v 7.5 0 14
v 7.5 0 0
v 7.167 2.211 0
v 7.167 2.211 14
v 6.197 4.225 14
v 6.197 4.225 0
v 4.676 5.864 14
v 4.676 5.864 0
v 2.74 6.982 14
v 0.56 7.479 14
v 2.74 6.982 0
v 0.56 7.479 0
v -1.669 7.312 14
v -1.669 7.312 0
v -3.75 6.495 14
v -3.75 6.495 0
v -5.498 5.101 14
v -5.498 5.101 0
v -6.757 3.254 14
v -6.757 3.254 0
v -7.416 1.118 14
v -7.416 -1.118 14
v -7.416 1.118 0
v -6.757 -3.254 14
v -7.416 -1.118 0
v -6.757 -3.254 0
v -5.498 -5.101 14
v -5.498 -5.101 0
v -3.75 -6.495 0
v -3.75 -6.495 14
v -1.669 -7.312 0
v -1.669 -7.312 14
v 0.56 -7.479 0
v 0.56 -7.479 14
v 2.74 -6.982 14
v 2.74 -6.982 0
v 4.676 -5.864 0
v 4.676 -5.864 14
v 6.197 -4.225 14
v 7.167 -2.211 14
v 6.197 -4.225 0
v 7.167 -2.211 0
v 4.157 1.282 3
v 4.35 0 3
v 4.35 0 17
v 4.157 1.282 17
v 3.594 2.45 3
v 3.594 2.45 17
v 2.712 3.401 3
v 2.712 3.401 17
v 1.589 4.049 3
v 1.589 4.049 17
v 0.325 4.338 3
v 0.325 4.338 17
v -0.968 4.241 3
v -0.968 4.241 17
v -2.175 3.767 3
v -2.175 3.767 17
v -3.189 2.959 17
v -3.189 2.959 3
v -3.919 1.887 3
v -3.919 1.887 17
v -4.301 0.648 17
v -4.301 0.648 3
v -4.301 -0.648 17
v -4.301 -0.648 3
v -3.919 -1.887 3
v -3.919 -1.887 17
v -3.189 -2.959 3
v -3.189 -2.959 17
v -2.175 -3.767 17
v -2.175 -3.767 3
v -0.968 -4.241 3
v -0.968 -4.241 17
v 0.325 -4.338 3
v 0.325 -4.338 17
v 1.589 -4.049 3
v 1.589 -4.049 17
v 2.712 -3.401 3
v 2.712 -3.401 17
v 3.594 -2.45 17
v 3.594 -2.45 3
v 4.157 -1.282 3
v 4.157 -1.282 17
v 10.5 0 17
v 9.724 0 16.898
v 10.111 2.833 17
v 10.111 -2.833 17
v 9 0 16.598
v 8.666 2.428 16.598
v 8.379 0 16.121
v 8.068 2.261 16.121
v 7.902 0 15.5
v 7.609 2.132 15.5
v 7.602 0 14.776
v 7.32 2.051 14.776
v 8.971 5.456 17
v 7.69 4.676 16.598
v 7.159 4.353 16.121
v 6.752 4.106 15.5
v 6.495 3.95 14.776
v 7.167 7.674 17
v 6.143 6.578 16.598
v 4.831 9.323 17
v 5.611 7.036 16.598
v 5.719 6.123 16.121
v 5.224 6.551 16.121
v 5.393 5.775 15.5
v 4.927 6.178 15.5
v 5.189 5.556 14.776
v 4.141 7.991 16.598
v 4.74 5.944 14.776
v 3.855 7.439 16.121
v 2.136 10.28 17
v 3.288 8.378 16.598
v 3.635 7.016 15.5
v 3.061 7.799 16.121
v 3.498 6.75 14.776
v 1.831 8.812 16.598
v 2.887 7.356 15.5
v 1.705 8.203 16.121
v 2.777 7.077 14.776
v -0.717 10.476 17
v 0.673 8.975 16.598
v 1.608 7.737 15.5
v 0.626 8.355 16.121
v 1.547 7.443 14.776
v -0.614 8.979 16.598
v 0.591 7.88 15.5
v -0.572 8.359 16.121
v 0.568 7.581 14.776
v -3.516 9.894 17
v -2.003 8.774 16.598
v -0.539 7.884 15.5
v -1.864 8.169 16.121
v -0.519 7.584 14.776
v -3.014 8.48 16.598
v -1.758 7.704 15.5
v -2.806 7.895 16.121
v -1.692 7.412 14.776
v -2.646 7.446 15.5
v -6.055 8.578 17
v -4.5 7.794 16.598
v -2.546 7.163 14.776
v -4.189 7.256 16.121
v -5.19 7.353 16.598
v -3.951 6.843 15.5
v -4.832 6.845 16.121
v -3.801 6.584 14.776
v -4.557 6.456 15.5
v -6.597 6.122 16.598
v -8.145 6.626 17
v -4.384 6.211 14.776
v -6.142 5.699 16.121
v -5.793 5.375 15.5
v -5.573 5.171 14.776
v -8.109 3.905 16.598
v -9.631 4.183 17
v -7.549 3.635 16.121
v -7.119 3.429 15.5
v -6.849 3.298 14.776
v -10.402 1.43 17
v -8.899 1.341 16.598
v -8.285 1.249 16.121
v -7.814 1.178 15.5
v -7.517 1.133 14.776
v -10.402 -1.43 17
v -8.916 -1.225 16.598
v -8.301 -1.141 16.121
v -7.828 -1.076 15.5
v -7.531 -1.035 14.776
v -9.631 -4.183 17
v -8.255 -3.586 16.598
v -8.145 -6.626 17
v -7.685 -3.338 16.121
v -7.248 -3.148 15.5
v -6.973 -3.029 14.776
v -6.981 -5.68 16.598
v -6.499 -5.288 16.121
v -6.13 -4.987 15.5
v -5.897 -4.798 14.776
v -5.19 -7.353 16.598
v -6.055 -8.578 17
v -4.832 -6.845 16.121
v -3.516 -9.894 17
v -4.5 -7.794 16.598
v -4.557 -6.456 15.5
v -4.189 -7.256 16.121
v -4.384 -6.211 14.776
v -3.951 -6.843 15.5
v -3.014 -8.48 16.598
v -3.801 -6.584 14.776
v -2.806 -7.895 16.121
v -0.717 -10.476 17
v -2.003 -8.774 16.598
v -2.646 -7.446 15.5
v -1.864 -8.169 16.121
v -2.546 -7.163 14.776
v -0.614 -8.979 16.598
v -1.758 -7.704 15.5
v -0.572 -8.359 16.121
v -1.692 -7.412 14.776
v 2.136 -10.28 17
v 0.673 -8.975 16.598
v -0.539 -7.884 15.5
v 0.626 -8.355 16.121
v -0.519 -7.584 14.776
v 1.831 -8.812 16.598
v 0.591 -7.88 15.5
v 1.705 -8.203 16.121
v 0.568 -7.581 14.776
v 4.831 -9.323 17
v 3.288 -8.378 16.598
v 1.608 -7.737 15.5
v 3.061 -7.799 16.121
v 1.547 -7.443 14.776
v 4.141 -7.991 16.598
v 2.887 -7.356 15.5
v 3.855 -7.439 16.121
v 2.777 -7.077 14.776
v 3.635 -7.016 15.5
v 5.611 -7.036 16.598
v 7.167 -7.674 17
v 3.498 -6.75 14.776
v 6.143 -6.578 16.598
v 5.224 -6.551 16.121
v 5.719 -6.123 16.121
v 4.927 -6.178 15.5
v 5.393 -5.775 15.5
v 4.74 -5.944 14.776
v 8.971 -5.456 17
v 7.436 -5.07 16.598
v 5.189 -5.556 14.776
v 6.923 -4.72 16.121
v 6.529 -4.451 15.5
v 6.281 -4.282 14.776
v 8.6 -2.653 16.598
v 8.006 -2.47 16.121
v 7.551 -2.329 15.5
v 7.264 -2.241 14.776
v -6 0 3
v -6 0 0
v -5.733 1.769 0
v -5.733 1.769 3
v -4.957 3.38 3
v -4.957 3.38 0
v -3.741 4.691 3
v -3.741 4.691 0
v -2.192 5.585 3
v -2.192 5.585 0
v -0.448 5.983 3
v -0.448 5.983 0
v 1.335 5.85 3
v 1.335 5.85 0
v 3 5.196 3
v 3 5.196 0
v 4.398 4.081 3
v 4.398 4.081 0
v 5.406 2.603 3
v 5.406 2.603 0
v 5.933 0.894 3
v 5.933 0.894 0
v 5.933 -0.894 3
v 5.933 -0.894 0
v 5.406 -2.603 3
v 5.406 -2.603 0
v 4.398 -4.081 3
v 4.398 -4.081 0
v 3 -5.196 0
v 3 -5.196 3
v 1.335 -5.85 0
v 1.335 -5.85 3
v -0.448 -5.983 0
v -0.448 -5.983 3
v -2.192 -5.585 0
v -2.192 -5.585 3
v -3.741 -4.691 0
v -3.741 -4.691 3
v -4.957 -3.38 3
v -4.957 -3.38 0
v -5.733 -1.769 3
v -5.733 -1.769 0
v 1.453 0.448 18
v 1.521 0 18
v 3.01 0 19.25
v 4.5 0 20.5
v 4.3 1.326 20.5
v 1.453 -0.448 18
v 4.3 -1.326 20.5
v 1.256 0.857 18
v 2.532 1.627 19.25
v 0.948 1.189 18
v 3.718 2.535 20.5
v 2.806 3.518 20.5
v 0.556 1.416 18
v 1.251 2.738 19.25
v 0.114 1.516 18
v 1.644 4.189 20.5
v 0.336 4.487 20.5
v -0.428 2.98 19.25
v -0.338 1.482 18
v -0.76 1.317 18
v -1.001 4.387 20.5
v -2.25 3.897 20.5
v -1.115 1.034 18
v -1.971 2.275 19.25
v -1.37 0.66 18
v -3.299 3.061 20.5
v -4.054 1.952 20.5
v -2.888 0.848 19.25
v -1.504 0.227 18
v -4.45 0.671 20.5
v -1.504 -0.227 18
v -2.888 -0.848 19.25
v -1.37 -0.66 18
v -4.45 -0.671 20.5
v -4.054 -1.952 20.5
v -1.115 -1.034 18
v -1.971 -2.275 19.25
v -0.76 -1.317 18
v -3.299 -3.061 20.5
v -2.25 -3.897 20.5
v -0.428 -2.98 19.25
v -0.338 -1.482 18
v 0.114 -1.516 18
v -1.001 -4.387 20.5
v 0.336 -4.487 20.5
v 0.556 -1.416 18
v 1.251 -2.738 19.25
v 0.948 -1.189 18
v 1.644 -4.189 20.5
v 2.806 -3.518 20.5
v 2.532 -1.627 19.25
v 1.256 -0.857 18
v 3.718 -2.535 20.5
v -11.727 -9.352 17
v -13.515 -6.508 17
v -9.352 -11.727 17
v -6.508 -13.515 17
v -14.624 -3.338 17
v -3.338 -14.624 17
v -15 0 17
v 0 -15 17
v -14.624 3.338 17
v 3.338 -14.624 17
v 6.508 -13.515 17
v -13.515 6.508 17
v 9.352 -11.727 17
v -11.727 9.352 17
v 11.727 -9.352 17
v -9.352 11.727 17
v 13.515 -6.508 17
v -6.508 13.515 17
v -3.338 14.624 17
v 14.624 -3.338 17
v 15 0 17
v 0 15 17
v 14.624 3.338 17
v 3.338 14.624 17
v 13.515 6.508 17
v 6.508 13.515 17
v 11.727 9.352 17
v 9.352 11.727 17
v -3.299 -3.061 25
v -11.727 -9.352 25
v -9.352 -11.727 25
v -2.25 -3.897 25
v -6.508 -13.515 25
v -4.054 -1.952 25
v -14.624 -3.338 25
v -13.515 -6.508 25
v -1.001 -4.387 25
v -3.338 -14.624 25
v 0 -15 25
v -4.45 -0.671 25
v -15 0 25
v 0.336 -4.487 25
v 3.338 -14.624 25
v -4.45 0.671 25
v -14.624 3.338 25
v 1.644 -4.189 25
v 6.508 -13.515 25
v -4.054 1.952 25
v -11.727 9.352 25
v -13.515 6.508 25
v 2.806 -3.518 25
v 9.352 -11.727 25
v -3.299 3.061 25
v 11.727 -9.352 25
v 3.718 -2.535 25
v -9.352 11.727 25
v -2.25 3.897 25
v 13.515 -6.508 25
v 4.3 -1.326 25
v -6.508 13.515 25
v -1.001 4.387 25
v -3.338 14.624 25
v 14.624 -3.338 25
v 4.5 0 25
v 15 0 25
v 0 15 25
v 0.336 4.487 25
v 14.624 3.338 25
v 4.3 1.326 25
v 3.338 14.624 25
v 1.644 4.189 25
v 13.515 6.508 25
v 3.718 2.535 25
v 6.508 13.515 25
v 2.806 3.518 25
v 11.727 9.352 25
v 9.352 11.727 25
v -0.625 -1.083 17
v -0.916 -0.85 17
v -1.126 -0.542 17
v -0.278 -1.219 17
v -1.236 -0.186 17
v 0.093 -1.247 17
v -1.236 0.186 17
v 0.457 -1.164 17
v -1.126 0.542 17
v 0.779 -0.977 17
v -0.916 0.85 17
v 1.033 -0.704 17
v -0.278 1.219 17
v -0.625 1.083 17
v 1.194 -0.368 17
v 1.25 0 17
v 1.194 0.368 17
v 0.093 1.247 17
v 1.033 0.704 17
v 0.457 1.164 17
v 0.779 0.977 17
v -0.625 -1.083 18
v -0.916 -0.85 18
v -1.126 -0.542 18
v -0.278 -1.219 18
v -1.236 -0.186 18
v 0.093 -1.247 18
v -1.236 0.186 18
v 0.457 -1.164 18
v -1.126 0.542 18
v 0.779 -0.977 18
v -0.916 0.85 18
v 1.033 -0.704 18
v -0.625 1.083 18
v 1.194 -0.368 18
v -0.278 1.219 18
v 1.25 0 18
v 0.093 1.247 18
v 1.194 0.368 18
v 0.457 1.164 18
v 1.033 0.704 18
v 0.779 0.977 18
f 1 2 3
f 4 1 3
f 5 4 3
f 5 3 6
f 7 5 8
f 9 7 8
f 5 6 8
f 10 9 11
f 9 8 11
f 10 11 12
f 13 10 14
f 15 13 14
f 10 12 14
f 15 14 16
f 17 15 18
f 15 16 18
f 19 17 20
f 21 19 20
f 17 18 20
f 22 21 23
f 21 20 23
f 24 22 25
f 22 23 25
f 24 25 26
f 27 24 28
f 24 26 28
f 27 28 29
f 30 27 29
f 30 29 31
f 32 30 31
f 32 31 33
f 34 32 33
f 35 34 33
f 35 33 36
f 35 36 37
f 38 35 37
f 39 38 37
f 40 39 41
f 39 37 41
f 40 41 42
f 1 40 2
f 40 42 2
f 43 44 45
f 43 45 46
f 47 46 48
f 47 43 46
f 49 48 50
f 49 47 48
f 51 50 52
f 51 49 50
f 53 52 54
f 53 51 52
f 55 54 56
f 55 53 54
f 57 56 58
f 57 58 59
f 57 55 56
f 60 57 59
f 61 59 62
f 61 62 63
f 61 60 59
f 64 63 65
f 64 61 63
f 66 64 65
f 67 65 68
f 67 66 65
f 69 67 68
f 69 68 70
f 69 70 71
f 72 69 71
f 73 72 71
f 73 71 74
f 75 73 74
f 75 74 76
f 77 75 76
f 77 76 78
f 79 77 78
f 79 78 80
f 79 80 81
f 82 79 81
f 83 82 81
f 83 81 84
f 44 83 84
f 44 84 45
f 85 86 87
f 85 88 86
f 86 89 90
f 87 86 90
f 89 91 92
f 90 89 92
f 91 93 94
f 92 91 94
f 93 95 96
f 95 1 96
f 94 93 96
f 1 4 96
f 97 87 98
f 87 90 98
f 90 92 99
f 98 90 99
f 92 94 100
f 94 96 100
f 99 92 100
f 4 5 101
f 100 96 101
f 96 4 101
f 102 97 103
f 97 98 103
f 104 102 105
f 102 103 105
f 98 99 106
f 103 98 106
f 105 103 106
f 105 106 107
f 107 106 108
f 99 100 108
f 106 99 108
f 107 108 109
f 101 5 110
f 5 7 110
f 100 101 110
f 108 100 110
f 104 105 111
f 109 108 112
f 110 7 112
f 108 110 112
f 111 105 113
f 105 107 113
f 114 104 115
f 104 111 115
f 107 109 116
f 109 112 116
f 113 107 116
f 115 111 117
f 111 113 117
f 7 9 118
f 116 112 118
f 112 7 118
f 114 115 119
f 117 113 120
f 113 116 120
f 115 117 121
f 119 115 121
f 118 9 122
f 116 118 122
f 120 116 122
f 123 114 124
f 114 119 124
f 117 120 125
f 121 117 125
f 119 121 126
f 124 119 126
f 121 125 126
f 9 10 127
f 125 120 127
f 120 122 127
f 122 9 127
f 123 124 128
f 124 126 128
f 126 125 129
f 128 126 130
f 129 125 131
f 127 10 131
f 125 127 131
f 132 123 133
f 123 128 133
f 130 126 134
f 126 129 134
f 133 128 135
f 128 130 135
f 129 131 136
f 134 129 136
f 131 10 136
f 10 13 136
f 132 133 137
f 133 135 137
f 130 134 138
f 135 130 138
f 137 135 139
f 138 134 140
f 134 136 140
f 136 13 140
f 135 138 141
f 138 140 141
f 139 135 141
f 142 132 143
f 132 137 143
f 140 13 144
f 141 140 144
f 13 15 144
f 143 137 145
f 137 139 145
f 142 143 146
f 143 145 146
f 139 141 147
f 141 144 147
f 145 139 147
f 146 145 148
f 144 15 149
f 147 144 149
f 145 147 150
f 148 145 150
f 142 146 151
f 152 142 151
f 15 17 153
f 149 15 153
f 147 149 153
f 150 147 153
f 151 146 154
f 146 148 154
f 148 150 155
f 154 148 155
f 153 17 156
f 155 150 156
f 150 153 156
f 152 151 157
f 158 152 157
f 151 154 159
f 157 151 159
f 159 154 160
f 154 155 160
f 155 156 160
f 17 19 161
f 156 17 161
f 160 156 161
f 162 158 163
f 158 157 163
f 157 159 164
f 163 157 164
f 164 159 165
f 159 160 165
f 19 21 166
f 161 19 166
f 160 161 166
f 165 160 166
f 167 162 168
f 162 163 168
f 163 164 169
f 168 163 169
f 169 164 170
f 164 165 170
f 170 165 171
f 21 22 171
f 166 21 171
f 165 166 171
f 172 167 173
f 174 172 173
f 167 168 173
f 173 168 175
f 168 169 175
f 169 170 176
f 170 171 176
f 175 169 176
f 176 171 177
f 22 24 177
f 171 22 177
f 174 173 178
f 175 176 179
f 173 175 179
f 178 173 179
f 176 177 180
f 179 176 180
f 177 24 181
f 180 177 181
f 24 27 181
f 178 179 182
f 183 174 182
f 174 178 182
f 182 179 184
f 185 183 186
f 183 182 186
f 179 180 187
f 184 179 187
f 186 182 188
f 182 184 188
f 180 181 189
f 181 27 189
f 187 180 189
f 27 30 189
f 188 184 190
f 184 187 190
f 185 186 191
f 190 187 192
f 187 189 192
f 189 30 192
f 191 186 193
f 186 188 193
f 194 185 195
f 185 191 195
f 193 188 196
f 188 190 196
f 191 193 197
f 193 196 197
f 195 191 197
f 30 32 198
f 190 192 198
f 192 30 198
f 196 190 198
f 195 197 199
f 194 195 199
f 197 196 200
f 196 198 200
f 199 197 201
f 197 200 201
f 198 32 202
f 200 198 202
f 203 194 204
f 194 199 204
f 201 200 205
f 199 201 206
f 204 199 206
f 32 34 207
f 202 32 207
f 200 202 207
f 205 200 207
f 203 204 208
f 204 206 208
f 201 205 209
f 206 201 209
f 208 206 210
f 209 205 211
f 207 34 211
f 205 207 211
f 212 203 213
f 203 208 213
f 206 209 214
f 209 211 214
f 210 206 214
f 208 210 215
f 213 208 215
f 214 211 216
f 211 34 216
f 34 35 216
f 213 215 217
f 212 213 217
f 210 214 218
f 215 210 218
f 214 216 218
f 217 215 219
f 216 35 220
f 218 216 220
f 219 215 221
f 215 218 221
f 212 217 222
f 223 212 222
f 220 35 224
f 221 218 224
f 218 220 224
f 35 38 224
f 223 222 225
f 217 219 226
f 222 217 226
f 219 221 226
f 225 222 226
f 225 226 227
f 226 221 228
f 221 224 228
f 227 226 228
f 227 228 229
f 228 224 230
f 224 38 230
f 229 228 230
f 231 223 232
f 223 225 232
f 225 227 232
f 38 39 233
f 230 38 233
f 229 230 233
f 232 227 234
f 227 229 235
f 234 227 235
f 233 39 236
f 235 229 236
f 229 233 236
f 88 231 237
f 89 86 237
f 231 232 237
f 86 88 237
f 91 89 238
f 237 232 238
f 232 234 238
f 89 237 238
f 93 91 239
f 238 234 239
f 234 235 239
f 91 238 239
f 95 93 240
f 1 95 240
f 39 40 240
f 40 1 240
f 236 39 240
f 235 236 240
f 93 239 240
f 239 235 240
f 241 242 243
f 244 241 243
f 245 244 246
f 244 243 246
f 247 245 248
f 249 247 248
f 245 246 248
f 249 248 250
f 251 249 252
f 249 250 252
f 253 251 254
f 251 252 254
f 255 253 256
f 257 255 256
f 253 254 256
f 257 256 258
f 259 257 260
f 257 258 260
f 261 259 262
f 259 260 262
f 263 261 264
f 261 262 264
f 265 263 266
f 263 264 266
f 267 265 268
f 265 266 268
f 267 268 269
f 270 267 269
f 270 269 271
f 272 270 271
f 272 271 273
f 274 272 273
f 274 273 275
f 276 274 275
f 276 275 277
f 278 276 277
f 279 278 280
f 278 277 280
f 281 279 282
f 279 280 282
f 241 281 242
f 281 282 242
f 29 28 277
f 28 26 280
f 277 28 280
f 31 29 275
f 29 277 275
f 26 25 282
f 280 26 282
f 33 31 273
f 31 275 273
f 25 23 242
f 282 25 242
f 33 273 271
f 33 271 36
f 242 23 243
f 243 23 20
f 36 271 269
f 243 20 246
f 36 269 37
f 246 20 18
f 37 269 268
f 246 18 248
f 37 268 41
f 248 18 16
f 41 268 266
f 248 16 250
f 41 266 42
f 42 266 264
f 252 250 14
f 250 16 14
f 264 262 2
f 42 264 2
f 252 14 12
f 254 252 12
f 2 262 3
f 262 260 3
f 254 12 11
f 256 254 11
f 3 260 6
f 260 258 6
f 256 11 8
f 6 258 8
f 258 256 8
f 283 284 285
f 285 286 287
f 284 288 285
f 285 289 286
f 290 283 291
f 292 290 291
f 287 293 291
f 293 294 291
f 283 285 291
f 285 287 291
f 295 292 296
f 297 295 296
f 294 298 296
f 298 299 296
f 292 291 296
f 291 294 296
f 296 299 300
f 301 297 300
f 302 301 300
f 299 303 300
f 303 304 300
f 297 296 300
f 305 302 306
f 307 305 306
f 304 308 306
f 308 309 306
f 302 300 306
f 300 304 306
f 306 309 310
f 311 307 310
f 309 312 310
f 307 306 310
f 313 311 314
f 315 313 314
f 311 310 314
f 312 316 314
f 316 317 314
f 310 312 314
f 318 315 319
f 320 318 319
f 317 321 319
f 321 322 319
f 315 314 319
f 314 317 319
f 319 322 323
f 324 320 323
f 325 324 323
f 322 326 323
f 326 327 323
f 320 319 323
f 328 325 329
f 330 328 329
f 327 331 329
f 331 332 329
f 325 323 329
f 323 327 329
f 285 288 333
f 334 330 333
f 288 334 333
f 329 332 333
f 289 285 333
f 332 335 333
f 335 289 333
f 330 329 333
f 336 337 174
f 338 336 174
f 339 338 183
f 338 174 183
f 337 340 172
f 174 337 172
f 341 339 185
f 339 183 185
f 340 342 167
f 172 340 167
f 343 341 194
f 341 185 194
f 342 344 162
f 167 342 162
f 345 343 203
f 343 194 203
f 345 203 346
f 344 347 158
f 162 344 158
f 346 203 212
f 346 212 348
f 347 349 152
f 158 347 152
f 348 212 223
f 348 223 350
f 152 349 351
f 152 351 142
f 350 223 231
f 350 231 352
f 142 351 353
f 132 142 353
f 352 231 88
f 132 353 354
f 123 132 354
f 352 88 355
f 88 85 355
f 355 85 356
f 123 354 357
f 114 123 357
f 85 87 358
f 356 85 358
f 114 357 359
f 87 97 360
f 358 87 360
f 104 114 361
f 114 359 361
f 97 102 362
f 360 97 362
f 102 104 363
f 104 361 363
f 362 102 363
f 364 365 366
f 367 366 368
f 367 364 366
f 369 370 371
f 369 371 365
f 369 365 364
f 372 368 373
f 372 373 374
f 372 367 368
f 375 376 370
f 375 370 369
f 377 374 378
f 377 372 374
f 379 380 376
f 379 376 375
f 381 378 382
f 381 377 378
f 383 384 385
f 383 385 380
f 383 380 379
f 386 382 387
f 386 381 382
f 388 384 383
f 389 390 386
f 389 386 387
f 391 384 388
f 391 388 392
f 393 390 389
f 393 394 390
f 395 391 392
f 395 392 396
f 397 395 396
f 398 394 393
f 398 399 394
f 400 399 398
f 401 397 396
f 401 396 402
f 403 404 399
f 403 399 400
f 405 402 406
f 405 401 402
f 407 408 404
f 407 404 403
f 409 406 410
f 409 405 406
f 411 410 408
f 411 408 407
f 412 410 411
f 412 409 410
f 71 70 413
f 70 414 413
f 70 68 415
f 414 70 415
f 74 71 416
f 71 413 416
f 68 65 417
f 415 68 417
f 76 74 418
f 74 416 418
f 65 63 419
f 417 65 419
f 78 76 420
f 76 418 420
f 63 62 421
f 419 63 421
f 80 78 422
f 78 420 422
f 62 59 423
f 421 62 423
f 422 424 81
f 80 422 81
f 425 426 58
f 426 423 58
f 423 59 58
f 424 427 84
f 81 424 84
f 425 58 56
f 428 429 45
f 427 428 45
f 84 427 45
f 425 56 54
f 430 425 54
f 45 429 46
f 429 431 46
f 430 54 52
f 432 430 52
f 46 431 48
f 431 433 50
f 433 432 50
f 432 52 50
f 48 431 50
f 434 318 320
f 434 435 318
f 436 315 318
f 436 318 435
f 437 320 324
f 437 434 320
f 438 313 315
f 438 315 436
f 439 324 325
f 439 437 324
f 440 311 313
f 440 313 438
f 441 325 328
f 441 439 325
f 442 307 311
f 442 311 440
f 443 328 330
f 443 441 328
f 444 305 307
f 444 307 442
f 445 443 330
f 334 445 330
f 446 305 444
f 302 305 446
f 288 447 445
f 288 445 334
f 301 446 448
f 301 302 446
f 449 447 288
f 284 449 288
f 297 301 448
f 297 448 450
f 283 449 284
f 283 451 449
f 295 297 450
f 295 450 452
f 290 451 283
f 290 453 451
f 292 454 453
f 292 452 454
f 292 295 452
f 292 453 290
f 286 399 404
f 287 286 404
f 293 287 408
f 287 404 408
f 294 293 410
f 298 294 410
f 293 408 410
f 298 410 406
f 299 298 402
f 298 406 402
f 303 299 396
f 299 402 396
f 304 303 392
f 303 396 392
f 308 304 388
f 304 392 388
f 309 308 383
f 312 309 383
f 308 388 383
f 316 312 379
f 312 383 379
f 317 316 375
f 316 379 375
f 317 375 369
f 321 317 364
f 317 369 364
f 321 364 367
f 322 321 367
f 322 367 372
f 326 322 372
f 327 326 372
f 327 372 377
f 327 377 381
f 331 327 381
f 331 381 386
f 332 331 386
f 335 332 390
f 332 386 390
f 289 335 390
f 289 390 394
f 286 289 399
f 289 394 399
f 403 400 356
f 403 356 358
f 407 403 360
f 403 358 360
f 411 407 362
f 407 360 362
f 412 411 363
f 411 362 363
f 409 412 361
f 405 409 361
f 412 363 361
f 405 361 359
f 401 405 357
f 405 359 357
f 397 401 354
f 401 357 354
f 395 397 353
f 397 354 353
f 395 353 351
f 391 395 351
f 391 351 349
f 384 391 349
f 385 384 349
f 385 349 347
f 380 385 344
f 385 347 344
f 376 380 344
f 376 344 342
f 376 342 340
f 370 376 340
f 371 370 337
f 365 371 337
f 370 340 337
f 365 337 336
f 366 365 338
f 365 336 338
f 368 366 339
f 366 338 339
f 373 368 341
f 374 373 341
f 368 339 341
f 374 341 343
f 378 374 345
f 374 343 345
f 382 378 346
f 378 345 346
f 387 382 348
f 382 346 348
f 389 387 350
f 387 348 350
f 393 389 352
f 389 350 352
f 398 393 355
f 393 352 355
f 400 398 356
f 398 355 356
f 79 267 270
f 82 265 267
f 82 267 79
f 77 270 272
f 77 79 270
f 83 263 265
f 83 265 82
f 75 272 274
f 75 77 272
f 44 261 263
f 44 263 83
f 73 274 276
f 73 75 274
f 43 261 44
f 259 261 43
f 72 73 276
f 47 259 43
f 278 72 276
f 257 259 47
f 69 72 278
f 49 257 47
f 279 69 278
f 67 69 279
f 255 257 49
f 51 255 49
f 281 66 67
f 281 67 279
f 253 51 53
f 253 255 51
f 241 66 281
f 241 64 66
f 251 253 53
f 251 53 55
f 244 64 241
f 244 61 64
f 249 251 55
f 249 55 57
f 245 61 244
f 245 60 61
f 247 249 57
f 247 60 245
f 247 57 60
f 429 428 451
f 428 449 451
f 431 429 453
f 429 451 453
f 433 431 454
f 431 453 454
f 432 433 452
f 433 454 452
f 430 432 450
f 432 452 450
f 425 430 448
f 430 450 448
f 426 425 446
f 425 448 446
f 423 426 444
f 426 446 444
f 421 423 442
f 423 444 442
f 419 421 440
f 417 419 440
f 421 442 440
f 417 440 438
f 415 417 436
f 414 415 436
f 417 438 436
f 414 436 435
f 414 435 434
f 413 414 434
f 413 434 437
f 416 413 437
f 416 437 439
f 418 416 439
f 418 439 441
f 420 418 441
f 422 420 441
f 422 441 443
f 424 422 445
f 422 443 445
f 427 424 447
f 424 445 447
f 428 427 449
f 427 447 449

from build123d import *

# Parameters (mm, degrees)
SKETCH_1_R          = 7.5
SKETCH_1_R_2        = 4.35
EXTRUDE_1_DEPTH     = 17
SKETCH_3_R          = 6
CUT_EXTRUDE_2_DEPTH = 3
SKETCH_4_R          = 7.5
EXTRUDE_3_DEPTH     = 8
SKETCH_5_R          = 1.25
CUT_EXTRUDE_4_DEPTH = 13.5
SKETCH_6_R          = 4.5
CUT_EXTRUDE_5_DEPTH = 4.5
SKETCH_7_R          = 4.5
CUT_EXTRUDE_6_DEPTH = 2.5
CUT_EXTRUDE_6_DRAFT = -50
EXTRUDE_START       = -8
SKETCH_8_R          = 15
SKETCH_8_R_2        = 7.5
EXTRUDE_8_DEPTH     = 8
FILLET_1_R          = 3


with BuildPart() as part:
    # Эскиз1 → Вытянуть1 (new body)
    with BuildSketch(Plane.XY):
        Circle(SKETCH_1_R)
        Circle(SKETCH_1_R_2, mode=Mode.SUBTRACT)
    extrude(amount=EXTRUDE_1_DEPTH)

    # Эскиз3 → Вытянуть2 (cut)
    with BuildSketch(Plane(origin=(0, 0, 0), x_dir=(-1, 0, 0), z_dir=(0, 0, -1))):
        Circle(SKETCH_3_R)
    extrude(amount=-CUT_EXTRUDE_2_DEPTH, mode=Mode.SUBTRACT)

    # Эскиз4 → Вытянуть3 (add)
    with BuildSketch(Plane.XY.offset(17)):
        Circle(SKETCH_4_R)
    extrude(amount=EXTRUDE_3_DEPTH)

    # Эскиз5 → Вытянуть4 (cut, symmetric)
    with BuildSketch(Plane.XY.offset(25)):
        Circle(SKETCH_5_R)
    extrude(amount=CUT_EXTRUDE_4_DEPTH, both=True, mode=Mode.SUBTRACT)

    # Эскиз6 → Вытянуть5 (cut)
    with BuildSketch(Plane.XY.offset(25)):
        Circle(SKETCH_6_R)
    extrude(amount=-CUT_EXTRUDE_5_DEPTH, mode=Mode.SUBTRACT)


with BuildPart() as cut_extrude_6_tool:
    # Эскиз7 → Вытянуть6 (with draft: the straight prism first)
    with BuildSketch(Plane.XY.offset(20.5)):
        Circle(SKETCH_7_R)
    extrude(amount=-CUT_EXTRUDE_6_DEPTH)
    # Вытянуть6: the draft: its side faces are tilted about the plane it starts from
    cut_extrude_6_sides = [cut_extrude_6_tool.faces().sort_by_distance(p)[0] for p in [
        (-4.5, 0, 19.25),
    ]]
    draft(cut_extrude_6_sides, Plane.XY.offset(20.5), CUT_EXTRUDE_6_DRAFT)


with BuildPart() as part_1:
    add(part.part)

    # Вытянуть6: cut by cut_extrude_6_tool
    add(cut_extrude_6_tool.part, mode=Mode.SUBTRACT)

    # Эскиз8 → Вытянуть8 (add)
    with BuildSketch(Plane.XY.offset(25).offset(EXTRUDE_START)):
        Circle(SKETCH_8_R)
        Circle(SKETCH_8_R_2, mode=Mode.SUBTRACT)
    extrude(amount=EXTRUDE_8_DEPTH)

    # Скругление1
    fillet_1_edges = [part_1.edges().sort_by_distance(p)[0] for p in [
        (-7.5, 0, 17),
    ]]
    fillet(fillet_1_edges, radius=FILLET_1_R)


solid = part_1.part
